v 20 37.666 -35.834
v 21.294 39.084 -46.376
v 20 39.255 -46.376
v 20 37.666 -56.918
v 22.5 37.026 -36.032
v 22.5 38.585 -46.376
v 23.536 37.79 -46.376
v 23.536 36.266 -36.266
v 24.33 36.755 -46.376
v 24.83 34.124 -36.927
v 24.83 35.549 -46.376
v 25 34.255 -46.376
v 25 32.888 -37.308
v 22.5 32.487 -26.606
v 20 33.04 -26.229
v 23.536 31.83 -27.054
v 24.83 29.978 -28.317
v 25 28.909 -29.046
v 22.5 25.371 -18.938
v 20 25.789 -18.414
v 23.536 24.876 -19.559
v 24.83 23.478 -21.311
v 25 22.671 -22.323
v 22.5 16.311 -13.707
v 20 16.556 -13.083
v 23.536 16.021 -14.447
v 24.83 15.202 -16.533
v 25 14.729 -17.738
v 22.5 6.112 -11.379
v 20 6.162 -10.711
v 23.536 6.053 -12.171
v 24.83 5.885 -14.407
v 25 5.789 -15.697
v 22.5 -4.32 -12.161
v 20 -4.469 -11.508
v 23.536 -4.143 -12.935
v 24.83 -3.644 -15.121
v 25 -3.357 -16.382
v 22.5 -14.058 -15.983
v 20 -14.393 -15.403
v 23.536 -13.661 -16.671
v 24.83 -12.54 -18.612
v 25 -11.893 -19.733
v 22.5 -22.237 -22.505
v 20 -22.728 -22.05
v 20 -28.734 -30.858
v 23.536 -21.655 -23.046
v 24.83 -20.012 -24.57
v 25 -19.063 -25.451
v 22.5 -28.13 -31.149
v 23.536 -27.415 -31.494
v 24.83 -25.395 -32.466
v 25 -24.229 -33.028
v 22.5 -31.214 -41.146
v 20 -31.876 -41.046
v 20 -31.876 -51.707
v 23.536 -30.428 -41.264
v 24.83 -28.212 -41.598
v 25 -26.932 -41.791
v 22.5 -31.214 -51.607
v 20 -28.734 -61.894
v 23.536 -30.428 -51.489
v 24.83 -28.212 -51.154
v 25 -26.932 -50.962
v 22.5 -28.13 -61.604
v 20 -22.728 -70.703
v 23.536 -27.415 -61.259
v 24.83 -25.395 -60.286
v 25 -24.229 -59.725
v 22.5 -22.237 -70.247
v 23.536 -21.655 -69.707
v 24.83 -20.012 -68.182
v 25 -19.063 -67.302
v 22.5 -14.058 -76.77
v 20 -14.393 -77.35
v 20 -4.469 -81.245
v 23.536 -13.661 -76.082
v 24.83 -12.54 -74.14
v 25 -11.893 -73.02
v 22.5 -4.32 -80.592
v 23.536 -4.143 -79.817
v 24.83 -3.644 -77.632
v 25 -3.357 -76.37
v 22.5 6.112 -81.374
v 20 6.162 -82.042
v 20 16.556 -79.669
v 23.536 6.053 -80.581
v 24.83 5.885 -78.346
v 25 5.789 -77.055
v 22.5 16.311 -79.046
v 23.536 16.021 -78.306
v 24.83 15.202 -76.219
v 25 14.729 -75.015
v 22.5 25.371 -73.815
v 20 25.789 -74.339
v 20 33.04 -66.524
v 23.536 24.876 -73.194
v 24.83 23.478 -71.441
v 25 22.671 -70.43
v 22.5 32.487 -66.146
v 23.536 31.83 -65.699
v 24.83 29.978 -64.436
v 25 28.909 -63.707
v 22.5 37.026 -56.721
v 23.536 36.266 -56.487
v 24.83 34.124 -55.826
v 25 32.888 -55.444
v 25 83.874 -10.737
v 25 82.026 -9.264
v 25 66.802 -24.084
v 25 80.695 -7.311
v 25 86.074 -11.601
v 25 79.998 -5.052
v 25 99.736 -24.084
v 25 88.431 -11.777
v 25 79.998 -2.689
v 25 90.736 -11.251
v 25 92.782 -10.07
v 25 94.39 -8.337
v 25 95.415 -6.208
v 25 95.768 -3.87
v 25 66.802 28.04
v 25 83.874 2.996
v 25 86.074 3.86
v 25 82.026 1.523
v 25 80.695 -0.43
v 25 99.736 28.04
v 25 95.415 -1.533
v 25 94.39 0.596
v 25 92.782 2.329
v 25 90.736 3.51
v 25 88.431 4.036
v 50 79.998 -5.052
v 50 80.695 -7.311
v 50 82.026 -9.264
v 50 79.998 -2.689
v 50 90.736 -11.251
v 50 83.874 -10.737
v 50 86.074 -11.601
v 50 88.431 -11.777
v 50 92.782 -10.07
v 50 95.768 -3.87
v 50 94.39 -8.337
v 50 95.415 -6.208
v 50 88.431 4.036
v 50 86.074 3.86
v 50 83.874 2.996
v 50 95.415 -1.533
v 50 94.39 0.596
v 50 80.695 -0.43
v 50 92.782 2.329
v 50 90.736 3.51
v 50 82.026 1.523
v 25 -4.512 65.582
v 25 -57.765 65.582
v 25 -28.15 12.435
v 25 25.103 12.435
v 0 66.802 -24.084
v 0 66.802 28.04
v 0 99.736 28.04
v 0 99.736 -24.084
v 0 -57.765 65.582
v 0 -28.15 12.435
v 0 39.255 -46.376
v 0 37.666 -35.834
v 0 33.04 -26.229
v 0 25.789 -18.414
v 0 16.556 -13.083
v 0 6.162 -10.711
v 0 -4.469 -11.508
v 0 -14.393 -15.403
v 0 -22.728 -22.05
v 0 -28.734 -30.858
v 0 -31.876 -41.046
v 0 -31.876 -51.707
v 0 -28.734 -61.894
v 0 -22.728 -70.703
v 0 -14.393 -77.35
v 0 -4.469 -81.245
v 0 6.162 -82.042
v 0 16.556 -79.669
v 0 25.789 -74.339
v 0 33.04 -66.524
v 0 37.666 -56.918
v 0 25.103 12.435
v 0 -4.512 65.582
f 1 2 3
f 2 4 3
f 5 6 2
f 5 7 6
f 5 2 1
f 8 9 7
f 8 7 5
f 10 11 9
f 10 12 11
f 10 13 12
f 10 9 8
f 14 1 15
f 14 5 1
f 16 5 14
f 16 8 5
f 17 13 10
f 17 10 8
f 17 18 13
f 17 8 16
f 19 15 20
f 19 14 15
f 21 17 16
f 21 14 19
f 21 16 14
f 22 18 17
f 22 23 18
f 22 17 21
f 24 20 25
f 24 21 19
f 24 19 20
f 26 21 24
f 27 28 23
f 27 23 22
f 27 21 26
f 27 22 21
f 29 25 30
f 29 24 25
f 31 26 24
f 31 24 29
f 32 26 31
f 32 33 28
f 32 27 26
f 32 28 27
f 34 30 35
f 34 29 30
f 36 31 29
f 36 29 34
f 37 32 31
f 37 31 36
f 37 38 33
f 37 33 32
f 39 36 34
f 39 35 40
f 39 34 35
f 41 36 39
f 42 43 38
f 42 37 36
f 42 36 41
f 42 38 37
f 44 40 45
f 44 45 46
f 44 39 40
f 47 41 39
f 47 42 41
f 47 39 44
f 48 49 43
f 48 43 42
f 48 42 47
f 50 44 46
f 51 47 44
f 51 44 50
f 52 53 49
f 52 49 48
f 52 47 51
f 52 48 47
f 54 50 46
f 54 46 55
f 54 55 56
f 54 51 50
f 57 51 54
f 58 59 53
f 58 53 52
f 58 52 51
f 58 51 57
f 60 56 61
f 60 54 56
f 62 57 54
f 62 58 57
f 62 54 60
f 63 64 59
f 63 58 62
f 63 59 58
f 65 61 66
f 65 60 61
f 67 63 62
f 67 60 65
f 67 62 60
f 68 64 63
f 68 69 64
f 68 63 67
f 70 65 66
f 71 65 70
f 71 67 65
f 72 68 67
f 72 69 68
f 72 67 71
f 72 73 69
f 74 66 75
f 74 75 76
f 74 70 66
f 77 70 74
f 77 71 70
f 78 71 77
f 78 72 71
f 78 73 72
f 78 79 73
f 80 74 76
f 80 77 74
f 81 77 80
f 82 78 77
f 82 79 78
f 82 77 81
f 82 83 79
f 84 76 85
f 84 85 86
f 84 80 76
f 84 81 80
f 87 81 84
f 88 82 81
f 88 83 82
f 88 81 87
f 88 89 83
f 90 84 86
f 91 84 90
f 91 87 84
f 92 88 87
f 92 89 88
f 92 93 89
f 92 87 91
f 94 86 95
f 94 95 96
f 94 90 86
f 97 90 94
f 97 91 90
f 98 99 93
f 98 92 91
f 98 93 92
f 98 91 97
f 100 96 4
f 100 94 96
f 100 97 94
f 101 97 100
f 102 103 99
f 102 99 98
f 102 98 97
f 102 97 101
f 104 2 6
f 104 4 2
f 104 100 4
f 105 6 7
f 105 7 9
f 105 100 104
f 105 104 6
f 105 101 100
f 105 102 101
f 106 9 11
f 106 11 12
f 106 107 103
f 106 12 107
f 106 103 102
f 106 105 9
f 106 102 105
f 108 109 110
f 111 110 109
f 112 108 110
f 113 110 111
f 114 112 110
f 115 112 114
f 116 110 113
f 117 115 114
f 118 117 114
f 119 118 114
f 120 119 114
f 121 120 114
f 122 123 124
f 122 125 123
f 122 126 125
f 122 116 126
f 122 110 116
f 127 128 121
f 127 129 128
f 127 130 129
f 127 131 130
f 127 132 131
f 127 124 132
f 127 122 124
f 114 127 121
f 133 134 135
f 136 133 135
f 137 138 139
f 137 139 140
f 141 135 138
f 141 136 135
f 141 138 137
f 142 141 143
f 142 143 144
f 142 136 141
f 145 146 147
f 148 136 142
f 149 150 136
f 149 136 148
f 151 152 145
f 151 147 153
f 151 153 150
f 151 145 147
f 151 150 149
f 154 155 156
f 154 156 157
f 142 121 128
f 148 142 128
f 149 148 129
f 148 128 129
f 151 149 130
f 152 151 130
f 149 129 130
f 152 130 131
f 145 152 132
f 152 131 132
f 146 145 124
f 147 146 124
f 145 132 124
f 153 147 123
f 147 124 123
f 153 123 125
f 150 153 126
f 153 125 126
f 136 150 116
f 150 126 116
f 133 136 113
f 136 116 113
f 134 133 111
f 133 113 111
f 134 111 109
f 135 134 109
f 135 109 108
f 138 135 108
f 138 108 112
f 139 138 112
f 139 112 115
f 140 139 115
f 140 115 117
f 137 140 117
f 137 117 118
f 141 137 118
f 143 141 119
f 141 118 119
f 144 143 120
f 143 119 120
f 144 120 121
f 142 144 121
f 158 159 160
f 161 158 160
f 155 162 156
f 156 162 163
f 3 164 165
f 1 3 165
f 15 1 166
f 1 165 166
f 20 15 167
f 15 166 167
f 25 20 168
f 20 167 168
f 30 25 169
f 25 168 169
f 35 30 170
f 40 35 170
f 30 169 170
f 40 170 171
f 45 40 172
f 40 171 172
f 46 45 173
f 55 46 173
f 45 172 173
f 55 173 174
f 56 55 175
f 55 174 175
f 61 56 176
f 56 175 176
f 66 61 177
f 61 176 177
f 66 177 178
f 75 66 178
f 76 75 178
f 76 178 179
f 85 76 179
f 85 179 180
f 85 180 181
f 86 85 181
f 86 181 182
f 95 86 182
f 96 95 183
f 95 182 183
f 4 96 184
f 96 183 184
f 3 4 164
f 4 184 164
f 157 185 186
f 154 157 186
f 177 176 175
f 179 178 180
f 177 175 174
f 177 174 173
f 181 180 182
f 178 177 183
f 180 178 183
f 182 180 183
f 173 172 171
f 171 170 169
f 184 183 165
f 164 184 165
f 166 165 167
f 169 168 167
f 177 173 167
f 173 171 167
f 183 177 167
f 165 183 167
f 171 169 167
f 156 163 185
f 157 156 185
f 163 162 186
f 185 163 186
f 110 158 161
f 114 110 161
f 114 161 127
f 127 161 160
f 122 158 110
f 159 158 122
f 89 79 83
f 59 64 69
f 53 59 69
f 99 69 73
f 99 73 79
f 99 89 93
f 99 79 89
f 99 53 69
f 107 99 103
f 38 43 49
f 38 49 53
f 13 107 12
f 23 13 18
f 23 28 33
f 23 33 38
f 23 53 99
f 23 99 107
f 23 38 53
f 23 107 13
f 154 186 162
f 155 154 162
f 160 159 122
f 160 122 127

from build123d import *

# Parameters (mm, degrees)
F0_R     = 35.765279
F0_W     = 32.934487
F0_H     = 52.124173
F1_DEPTH = 25
F2_R     = 5
F3_R     = 7.928907
F4_DEPTH = 25


with BuildPart() as f1:
    # F0 (on Right) → F1 (new body)
    with BuildSketch(Plane.YZ):
        Polygon((-4.511893, 65.581568), (-57.764888, 65.581568), (-28.150409, 12.434766), (25.102586, 12.434766), align=None)
        with Locations((3.489411, -46.376237)):
            Circle(F0_R)
        with Locations((83.269178, 1.977607)):
            Rectangle(F0_W, F0_H)
    extrude(amount=F1_DEPTH)

    # F2
    f2_edges = [f1.edges().sort_by_distance(p)[0] for p in [
        (25, -32.275868, -46.376237),
    ]]
    fillet(f2_edges, radius=F2_R)

    # F3 (on face) → F4 (join)
    with BuildSketch(Plane.YZ.offset(25)):
        with Locations((87.838791, -3.870482)):
            Circle(F3_R)
    extrude(amount=F4_DEPTH)


solid = f1.part
